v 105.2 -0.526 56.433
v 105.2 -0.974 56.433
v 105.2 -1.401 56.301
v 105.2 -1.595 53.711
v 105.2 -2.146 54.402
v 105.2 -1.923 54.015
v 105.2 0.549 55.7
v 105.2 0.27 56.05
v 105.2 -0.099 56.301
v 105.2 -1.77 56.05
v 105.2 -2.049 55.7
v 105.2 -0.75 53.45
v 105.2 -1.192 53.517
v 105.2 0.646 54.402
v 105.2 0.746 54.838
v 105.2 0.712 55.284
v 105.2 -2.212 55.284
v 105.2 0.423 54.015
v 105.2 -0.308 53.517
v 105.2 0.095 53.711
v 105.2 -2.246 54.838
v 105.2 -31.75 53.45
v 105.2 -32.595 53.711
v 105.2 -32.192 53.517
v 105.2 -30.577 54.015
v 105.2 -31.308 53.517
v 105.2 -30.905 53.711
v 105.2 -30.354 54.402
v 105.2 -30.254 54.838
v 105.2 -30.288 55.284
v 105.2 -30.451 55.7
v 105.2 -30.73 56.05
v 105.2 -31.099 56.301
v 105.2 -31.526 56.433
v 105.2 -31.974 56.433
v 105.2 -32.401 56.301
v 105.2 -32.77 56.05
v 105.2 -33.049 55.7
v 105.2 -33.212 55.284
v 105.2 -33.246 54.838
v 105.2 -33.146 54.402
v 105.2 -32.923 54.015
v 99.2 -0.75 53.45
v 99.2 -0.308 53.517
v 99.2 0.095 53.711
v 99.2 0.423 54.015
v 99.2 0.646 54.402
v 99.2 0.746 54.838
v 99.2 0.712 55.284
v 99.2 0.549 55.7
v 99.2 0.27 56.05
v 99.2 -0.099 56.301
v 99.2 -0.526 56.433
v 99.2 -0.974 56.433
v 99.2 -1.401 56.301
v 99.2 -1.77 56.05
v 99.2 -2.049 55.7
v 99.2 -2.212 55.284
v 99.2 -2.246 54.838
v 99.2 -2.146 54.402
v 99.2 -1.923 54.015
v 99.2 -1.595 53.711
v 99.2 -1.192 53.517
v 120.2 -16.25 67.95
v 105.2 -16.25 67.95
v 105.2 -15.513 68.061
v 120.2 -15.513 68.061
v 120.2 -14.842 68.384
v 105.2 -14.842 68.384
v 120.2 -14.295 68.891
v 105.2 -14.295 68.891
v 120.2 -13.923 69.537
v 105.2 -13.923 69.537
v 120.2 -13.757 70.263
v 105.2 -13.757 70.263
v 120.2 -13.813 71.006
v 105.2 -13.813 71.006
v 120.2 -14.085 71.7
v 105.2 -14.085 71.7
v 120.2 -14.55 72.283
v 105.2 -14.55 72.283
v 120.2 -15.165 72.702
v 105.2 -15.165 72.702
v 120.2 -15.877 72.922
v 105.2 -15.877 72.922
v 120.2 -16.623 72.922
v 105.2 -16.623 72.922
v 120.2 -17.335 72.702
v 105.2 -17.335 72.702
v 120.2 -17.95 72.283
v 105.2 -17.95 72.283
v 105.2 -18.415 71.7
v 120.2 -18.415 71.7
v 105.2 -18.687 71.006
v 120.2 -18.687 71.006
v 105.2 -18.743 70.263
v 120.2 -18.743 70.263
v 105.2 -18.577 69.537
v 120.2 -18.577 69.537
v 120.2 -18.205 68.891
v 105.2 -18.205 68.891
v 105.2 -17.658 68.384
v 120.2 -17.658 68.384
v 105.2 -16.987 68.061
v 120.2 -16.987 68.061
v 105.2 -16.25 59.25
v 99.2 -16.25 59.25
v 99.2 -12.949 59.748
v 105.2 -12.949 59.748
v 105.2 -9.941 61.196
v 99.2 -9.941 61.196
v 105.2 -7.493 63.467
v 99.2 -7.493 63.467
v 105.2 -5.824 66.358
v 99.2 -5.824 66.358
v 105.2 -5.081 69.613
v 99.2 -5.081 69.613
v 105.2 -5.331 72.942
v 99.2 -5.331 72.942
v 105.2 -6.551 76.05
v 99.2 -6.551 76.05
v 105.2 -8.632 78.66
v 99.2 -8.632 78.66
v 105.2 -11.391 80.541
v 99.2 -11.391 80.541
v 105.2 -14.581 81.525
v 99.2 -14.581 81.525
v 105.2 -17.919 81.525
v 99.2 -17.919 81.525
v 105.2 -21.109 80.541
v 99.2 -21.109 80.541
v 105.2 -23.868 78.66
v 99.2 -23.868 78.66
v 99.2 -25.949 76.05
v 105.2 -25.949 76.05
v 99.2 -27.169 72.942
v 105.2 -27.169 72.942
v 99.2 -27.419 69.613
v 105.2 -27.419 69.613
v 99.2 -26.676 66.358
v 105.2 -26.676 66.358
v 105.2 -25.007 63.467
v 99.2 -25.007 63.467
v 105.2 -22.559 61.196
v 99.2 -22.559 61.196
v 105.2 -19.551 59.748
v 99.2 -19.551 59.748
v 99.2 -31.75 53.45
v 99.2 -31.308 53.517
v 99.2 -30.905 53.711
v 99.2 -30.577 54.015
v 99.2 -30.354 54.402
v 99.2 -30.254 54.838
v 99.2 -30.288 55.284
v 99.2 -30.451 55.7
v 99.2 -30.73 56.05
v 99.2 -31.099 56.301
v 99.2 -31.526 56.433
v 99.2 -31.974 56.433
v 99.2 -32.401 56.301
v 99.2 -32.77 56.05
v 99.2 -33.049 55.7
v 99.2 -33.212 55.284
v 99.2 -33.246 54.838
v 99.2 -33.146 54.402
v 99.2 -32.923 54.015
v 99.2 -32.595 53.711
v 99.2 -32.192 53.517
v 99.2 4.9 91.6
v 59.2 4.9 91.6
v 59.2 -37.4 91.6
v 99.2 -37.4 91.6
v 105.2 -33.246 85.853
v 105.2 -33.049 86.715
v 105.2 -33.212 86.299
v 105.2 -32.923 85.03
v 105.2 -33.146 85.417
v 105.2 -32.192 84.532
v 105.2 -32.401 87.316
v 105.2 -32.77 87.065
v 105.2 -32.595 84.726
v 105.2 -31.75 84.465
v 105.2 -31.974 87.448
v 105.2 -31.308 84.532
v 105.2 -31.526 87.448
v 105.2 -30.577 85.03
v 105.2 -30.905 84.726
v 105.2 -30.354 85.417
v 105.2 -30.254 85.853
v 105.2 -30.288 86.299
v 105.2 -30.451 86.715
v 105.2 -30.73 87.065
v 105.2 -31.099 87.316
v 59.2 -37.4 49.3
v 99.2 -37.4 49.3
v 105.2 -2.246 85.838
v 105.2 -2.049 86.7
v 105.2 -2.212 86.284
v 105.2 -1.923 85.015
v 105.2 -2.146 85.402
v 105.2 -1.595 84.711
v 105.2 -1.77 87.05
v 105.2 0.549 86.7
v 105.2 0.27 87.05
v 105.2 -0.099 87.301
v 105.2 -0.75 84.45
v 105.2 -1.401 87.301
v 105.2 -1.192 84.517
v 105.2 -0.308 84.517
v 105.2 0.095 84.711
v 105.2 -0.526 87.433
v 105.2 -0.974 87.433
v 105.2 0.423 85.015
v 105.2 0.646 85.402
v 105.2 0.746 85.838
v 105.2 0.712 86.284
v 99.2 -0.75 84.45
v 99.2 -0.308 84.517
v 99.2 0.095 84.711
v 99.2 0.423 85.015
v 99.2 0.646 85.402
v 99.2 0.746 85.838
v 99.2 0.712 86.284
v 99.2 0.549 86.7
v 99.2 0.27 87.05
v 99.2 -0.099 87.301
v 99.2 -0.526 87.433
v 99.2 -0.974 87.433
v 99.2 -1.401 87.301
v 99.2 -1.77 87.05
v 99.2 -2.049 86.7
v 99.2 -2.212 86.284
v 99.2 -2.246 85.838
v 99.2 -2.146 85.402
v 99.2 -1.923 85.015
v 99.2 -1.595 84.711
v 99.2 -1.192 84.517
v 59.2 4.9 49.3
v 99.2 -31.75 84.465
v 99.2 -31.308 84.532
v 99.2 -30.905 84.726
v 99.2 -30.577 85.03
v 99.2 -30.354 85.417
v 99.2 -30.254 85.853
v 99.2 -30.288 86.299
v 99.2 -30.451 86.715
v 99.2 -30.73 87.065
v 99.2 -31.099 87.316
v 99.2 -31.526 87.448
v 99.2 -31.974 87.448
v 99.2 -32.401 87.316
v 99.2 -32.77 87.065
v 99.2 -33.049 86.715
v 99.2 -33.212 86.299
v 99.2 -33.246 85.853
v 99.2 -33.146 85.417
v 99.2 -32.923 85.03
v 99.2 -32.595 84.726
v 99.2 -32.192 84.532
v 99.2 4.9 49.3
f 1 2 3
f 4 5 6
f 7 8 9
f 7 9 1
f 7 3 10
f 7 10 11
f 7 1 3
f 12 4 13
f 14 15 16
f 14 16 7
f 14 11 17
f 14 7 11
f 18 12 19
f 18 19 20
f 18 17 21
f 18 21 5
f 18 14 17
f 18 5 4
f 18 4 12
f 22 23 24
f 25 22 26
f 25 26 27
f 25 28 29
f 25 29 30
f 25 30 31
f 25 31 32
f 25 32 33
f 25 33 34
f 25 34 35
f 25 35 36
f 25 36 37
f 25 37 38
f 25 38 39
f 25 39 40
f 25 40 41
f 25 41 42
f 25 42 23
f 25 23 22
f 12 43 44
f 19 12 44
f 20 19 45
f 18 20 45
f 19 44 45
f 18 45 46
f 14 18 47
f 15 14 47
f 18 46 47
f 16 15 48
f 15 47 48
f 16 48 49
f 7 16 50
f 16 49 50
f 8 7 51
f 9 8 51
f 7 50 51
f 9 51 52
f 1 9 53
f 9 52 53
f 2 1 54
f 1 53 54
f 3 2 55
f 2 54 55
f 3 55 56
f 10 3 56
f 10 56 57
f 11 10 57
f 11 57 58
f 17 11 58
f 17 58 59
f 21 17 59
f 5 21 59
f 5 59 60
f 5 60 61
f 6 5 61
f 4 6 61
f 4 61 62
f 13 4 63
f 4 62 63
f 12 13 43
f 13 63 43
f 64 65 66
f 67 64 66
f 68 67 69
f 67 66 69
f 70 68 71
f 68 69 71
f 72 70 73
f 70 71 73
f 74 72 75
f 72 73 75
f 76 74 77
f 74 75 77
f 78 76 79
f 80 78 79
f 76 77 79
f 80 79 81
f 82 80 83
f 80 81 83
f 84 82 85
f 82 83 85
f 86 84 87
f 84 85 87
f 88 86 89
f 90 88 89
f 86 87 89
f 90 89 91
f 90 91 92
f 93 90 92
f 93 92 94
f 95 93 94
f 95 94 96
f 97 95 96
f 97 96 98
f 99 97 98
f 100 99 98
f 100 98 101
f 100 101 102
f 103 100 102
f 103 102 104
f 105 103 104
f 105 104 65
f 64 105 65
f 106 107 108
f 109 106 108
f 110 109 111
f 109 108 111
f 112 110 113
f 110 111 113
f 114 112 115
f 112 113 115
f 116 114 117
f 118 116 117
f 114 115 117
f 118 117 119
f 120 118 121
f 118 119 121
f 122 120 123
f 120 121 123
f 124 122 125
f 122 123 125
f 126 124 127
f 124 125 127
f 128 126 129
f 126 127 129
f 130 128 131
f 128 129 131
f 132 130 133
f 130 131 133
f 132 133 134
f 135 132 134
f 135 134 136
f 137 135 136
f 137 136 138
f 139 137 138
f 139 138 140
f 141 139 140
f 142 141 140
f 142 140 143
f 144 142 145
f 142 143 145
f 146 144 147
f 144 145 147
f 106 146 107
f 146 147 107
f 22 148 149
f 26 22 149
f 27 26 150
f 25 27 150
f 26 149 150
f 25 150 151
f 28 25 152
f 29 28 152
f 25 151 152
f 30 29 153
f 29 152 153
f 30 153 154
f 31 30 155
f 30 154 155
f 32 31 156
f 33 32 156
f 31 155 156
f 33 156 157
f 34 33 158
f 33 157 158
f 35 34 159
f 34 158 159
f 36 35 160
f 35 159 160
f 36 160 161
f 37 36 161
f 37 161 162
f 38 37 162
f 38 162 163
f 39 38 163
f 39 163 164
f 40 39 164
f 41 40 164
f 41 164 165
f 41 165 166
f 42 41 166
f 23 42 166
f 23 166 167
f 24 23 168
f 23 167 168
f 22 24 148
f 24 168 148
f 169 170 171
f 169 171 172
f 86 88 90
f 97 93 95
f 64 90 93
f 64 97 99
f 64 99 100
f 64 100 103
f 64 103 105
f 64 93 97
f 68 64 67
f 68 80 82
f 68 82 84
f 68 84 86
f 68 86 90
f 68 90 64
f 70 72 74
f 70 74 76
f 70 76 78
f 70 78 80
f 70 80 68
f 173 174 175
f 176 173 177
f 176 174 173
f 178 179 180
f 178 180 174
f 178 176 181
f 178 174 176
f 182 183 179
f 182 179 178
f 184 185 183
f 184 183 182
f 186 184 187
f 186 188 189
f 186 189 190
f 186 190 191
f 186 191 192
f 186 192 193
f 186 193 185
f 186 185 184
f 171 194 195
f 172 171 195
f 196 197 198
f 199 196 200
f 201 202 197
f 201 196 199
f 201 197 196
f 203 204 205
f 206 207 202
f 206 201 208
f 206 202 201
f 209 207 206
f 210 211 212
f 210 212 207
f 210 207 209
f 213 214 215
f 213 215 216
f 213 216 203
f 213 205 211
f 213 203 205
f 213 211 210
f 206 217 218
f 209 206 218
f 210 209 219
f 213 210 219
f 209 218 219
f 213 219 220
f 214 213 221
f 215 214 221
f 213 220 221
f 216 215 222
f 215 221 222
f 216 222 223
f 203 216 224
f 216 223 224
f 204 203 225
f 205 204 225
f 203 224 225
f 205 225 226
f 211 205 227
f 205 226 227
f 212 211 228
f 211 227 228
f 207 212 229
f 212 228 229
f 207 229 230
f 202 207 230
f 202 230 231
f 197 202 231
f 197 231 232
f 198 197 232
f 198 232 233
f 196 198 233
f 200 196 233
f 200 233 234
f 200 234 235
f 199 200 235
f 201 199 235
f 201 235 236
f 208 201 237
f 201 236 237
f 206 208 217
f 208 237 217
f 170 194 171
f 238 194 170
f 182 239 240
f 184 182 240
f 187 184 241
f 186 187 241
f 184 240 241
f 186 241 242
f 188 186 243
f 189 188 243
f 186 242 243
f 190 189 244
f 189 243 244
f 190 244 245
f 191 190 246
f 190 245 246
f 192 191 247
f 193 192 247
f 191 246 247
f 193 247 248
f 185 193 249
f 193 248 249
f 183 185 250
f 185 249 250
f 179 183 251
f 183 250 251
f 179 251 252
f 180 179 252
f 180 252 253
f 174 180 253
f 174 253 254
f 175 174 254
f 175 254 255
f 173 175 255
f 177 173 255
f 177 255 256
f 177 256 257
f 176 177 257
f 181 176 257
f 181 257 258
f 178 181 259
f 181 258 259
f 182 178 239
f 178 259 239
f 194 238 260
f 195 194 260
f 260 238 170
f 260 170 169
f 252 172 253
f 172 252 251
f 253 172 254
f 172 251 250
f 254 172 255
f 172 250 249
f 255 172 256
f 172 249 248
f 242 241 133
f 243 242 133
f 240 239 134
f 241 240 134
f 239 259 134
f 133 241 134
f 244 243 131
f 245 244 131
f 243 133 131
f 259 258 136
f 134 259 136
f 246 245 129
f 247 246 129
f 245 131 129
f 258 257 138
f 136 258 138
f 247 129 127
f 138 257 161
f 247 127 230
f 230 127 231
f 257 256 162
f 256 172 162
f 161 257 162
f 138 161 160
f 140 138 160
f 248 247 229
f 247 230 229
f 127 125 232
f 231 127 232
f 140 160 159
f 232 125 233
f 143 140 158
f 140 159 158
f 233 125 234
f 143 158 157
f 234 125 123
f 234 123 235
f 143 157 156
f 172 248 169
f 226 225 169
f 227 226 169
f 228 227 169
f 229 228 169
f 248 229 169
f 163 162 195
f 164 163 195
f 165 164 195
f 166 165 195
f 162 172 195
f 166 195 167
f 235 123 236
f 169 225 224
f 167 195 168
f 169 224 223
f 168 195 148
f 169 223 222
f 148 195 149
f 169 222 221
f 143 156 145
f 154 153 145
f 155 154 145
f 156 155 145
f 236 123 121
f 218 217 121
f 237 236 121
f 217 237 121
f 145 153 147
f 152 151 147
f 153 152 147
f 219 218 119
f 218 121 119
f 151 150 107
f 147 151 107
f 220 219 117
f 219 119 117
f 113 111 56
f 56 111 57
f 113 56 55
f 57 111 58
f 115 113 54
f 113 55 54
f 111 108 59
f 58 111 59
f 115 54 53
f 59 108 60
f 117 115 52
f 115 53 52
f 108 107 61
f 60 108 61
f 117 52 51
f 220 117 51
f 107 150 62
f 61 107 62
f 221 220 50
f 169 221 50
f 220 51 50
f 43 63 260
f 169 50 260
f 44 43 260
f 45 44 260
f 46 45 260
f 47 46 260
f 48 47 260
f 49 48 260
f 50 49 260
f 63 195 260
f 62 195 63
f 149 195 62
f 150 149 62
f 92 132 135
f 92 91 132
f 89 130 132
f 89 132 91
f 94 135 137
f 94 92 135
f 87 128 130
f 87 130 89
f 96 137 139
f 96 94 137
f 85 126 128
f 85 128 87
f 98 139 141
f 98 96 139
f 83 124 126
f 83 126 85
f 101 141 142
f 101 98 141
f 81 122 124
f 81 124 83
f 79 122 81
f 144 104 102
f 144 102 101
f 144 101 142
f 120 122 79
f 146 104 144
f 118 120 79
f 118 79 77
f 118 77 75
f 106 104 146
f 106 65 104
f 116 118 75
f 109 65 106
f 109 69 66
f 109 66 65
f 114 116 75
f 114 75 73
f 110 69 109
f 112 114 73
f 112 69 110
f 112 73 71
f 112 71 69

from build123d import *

# Parameters (mm, degrees)
CYLINDER231_R     = 1.5
CYLINDER231_DEPTH = 6
CYLINDER229_R     = 1.5
CYLINDER229_DEPTH = 6
CYLINDER227_R     = 11.2
CYLINDER227_DEPTH = 6
CYLINDER_R        = 2.5
CYLINDER_DEPTH    = 21
CYLINDER230_R     = 1.5
CYLINDER230_DEPTH = 6
CYLINDER228_R     = 1.5
CYLINDER228_DEPTH = 6
BOX_W             = 40
BOX_H             = 42.3
BOX_DEPTH         = 42.3


with BuildPart() as cylinder231:
    # Cylinder231 → Cylinder231 (new body)
    with BuildSketch(Plane(origin=(40, 5.65, 36.665), x_dir=(0, 0, -1), z_dir=(1, 0, 0))):
        Circle(CYLINDER231_R)
    extrude(amount=CYLINDER231_DEPTH)


with BuildPart() as cylinder229:
    # Cylinder229 → Cylinder229 (new body)
    with BuildSketch(Plane(origin=(40, 36.65, 36.65), x_dir=(0, 0, -1), z_dir=(1, 0, 0))):
        Circle(CYLINDER229_R)
    extrude(amount=CYLINDER229_DEPTH)


with BuildPart() as cylinder227:
    # Cylinder227 → Cylinder227 (new body)
    with BuildSketch(Plane(origin=(40, 21.15, 21.15), x_dir=(0, 0, -1), z_dir=(1, 0, 0))):
        Circle(CYLINDER227_R)
    extrude(amount=CYLINDER227_DEPTH)


with BuildPart() as cylinder:
    # Cylinder → Cylinder (new body)
    with BuildSketch(Plane(origin=(40, 21.15, 21.15), x_dir=(0, 0, -1), z_dir=(1, 0, 0))):
        Circle(CYLINDER_R)
    extrude(amount=CYLINDER_DEPTH)


with BuildPart() as cylinder230:
    # Cylinder230 → Cylinder230 (new body)
    with BuildSketch(Plane(origin=(40, 5.65, 5.65), x_dir=(0, 0, -1), z_dir=(1, 0, 0))):
        Circle(CYLINDER230_R)
    extrude(amount=CYLINDER230_DEPTH)


with BuildPart() as cylinder228:
    # Cylinder228 → Cylinder228 (new body)
    with BuildSketch(Plane(origin=(40, 36.65, 5.65), x_dir=(0, 0, -1), z_dir=(1, 0, 0))):
        Circle(CYLINDER228_R)
    extrude(amount=CYLINDER228_DEPTH)


with BuildPart() as fusion:
    # Box → Box (new body)
    with BuildSketch(Plane.XY):
        with Locations((20, 21.15)):
            Rectangle(BOX_W, BOX_H)
    extrude(amount=BOX_DEPTH)

    # Fusion: union Cylinder231, Cylinder229, Cylinder227, Cylinder, Cylinder230, Cylinder228
    add(cylinder231.part)
    add(cylinder229.part)
    add(cylinder227.part)
    add(cylinder.part)
    add(cylinder230.part)
    add(cylinder228.part)


with BuildPart() as fusion_1:
    # Fusion placement: moved
    add(fusion.part.moved(Location((59.2, -37.4, 49.3))))


solid = fusion_1.part
